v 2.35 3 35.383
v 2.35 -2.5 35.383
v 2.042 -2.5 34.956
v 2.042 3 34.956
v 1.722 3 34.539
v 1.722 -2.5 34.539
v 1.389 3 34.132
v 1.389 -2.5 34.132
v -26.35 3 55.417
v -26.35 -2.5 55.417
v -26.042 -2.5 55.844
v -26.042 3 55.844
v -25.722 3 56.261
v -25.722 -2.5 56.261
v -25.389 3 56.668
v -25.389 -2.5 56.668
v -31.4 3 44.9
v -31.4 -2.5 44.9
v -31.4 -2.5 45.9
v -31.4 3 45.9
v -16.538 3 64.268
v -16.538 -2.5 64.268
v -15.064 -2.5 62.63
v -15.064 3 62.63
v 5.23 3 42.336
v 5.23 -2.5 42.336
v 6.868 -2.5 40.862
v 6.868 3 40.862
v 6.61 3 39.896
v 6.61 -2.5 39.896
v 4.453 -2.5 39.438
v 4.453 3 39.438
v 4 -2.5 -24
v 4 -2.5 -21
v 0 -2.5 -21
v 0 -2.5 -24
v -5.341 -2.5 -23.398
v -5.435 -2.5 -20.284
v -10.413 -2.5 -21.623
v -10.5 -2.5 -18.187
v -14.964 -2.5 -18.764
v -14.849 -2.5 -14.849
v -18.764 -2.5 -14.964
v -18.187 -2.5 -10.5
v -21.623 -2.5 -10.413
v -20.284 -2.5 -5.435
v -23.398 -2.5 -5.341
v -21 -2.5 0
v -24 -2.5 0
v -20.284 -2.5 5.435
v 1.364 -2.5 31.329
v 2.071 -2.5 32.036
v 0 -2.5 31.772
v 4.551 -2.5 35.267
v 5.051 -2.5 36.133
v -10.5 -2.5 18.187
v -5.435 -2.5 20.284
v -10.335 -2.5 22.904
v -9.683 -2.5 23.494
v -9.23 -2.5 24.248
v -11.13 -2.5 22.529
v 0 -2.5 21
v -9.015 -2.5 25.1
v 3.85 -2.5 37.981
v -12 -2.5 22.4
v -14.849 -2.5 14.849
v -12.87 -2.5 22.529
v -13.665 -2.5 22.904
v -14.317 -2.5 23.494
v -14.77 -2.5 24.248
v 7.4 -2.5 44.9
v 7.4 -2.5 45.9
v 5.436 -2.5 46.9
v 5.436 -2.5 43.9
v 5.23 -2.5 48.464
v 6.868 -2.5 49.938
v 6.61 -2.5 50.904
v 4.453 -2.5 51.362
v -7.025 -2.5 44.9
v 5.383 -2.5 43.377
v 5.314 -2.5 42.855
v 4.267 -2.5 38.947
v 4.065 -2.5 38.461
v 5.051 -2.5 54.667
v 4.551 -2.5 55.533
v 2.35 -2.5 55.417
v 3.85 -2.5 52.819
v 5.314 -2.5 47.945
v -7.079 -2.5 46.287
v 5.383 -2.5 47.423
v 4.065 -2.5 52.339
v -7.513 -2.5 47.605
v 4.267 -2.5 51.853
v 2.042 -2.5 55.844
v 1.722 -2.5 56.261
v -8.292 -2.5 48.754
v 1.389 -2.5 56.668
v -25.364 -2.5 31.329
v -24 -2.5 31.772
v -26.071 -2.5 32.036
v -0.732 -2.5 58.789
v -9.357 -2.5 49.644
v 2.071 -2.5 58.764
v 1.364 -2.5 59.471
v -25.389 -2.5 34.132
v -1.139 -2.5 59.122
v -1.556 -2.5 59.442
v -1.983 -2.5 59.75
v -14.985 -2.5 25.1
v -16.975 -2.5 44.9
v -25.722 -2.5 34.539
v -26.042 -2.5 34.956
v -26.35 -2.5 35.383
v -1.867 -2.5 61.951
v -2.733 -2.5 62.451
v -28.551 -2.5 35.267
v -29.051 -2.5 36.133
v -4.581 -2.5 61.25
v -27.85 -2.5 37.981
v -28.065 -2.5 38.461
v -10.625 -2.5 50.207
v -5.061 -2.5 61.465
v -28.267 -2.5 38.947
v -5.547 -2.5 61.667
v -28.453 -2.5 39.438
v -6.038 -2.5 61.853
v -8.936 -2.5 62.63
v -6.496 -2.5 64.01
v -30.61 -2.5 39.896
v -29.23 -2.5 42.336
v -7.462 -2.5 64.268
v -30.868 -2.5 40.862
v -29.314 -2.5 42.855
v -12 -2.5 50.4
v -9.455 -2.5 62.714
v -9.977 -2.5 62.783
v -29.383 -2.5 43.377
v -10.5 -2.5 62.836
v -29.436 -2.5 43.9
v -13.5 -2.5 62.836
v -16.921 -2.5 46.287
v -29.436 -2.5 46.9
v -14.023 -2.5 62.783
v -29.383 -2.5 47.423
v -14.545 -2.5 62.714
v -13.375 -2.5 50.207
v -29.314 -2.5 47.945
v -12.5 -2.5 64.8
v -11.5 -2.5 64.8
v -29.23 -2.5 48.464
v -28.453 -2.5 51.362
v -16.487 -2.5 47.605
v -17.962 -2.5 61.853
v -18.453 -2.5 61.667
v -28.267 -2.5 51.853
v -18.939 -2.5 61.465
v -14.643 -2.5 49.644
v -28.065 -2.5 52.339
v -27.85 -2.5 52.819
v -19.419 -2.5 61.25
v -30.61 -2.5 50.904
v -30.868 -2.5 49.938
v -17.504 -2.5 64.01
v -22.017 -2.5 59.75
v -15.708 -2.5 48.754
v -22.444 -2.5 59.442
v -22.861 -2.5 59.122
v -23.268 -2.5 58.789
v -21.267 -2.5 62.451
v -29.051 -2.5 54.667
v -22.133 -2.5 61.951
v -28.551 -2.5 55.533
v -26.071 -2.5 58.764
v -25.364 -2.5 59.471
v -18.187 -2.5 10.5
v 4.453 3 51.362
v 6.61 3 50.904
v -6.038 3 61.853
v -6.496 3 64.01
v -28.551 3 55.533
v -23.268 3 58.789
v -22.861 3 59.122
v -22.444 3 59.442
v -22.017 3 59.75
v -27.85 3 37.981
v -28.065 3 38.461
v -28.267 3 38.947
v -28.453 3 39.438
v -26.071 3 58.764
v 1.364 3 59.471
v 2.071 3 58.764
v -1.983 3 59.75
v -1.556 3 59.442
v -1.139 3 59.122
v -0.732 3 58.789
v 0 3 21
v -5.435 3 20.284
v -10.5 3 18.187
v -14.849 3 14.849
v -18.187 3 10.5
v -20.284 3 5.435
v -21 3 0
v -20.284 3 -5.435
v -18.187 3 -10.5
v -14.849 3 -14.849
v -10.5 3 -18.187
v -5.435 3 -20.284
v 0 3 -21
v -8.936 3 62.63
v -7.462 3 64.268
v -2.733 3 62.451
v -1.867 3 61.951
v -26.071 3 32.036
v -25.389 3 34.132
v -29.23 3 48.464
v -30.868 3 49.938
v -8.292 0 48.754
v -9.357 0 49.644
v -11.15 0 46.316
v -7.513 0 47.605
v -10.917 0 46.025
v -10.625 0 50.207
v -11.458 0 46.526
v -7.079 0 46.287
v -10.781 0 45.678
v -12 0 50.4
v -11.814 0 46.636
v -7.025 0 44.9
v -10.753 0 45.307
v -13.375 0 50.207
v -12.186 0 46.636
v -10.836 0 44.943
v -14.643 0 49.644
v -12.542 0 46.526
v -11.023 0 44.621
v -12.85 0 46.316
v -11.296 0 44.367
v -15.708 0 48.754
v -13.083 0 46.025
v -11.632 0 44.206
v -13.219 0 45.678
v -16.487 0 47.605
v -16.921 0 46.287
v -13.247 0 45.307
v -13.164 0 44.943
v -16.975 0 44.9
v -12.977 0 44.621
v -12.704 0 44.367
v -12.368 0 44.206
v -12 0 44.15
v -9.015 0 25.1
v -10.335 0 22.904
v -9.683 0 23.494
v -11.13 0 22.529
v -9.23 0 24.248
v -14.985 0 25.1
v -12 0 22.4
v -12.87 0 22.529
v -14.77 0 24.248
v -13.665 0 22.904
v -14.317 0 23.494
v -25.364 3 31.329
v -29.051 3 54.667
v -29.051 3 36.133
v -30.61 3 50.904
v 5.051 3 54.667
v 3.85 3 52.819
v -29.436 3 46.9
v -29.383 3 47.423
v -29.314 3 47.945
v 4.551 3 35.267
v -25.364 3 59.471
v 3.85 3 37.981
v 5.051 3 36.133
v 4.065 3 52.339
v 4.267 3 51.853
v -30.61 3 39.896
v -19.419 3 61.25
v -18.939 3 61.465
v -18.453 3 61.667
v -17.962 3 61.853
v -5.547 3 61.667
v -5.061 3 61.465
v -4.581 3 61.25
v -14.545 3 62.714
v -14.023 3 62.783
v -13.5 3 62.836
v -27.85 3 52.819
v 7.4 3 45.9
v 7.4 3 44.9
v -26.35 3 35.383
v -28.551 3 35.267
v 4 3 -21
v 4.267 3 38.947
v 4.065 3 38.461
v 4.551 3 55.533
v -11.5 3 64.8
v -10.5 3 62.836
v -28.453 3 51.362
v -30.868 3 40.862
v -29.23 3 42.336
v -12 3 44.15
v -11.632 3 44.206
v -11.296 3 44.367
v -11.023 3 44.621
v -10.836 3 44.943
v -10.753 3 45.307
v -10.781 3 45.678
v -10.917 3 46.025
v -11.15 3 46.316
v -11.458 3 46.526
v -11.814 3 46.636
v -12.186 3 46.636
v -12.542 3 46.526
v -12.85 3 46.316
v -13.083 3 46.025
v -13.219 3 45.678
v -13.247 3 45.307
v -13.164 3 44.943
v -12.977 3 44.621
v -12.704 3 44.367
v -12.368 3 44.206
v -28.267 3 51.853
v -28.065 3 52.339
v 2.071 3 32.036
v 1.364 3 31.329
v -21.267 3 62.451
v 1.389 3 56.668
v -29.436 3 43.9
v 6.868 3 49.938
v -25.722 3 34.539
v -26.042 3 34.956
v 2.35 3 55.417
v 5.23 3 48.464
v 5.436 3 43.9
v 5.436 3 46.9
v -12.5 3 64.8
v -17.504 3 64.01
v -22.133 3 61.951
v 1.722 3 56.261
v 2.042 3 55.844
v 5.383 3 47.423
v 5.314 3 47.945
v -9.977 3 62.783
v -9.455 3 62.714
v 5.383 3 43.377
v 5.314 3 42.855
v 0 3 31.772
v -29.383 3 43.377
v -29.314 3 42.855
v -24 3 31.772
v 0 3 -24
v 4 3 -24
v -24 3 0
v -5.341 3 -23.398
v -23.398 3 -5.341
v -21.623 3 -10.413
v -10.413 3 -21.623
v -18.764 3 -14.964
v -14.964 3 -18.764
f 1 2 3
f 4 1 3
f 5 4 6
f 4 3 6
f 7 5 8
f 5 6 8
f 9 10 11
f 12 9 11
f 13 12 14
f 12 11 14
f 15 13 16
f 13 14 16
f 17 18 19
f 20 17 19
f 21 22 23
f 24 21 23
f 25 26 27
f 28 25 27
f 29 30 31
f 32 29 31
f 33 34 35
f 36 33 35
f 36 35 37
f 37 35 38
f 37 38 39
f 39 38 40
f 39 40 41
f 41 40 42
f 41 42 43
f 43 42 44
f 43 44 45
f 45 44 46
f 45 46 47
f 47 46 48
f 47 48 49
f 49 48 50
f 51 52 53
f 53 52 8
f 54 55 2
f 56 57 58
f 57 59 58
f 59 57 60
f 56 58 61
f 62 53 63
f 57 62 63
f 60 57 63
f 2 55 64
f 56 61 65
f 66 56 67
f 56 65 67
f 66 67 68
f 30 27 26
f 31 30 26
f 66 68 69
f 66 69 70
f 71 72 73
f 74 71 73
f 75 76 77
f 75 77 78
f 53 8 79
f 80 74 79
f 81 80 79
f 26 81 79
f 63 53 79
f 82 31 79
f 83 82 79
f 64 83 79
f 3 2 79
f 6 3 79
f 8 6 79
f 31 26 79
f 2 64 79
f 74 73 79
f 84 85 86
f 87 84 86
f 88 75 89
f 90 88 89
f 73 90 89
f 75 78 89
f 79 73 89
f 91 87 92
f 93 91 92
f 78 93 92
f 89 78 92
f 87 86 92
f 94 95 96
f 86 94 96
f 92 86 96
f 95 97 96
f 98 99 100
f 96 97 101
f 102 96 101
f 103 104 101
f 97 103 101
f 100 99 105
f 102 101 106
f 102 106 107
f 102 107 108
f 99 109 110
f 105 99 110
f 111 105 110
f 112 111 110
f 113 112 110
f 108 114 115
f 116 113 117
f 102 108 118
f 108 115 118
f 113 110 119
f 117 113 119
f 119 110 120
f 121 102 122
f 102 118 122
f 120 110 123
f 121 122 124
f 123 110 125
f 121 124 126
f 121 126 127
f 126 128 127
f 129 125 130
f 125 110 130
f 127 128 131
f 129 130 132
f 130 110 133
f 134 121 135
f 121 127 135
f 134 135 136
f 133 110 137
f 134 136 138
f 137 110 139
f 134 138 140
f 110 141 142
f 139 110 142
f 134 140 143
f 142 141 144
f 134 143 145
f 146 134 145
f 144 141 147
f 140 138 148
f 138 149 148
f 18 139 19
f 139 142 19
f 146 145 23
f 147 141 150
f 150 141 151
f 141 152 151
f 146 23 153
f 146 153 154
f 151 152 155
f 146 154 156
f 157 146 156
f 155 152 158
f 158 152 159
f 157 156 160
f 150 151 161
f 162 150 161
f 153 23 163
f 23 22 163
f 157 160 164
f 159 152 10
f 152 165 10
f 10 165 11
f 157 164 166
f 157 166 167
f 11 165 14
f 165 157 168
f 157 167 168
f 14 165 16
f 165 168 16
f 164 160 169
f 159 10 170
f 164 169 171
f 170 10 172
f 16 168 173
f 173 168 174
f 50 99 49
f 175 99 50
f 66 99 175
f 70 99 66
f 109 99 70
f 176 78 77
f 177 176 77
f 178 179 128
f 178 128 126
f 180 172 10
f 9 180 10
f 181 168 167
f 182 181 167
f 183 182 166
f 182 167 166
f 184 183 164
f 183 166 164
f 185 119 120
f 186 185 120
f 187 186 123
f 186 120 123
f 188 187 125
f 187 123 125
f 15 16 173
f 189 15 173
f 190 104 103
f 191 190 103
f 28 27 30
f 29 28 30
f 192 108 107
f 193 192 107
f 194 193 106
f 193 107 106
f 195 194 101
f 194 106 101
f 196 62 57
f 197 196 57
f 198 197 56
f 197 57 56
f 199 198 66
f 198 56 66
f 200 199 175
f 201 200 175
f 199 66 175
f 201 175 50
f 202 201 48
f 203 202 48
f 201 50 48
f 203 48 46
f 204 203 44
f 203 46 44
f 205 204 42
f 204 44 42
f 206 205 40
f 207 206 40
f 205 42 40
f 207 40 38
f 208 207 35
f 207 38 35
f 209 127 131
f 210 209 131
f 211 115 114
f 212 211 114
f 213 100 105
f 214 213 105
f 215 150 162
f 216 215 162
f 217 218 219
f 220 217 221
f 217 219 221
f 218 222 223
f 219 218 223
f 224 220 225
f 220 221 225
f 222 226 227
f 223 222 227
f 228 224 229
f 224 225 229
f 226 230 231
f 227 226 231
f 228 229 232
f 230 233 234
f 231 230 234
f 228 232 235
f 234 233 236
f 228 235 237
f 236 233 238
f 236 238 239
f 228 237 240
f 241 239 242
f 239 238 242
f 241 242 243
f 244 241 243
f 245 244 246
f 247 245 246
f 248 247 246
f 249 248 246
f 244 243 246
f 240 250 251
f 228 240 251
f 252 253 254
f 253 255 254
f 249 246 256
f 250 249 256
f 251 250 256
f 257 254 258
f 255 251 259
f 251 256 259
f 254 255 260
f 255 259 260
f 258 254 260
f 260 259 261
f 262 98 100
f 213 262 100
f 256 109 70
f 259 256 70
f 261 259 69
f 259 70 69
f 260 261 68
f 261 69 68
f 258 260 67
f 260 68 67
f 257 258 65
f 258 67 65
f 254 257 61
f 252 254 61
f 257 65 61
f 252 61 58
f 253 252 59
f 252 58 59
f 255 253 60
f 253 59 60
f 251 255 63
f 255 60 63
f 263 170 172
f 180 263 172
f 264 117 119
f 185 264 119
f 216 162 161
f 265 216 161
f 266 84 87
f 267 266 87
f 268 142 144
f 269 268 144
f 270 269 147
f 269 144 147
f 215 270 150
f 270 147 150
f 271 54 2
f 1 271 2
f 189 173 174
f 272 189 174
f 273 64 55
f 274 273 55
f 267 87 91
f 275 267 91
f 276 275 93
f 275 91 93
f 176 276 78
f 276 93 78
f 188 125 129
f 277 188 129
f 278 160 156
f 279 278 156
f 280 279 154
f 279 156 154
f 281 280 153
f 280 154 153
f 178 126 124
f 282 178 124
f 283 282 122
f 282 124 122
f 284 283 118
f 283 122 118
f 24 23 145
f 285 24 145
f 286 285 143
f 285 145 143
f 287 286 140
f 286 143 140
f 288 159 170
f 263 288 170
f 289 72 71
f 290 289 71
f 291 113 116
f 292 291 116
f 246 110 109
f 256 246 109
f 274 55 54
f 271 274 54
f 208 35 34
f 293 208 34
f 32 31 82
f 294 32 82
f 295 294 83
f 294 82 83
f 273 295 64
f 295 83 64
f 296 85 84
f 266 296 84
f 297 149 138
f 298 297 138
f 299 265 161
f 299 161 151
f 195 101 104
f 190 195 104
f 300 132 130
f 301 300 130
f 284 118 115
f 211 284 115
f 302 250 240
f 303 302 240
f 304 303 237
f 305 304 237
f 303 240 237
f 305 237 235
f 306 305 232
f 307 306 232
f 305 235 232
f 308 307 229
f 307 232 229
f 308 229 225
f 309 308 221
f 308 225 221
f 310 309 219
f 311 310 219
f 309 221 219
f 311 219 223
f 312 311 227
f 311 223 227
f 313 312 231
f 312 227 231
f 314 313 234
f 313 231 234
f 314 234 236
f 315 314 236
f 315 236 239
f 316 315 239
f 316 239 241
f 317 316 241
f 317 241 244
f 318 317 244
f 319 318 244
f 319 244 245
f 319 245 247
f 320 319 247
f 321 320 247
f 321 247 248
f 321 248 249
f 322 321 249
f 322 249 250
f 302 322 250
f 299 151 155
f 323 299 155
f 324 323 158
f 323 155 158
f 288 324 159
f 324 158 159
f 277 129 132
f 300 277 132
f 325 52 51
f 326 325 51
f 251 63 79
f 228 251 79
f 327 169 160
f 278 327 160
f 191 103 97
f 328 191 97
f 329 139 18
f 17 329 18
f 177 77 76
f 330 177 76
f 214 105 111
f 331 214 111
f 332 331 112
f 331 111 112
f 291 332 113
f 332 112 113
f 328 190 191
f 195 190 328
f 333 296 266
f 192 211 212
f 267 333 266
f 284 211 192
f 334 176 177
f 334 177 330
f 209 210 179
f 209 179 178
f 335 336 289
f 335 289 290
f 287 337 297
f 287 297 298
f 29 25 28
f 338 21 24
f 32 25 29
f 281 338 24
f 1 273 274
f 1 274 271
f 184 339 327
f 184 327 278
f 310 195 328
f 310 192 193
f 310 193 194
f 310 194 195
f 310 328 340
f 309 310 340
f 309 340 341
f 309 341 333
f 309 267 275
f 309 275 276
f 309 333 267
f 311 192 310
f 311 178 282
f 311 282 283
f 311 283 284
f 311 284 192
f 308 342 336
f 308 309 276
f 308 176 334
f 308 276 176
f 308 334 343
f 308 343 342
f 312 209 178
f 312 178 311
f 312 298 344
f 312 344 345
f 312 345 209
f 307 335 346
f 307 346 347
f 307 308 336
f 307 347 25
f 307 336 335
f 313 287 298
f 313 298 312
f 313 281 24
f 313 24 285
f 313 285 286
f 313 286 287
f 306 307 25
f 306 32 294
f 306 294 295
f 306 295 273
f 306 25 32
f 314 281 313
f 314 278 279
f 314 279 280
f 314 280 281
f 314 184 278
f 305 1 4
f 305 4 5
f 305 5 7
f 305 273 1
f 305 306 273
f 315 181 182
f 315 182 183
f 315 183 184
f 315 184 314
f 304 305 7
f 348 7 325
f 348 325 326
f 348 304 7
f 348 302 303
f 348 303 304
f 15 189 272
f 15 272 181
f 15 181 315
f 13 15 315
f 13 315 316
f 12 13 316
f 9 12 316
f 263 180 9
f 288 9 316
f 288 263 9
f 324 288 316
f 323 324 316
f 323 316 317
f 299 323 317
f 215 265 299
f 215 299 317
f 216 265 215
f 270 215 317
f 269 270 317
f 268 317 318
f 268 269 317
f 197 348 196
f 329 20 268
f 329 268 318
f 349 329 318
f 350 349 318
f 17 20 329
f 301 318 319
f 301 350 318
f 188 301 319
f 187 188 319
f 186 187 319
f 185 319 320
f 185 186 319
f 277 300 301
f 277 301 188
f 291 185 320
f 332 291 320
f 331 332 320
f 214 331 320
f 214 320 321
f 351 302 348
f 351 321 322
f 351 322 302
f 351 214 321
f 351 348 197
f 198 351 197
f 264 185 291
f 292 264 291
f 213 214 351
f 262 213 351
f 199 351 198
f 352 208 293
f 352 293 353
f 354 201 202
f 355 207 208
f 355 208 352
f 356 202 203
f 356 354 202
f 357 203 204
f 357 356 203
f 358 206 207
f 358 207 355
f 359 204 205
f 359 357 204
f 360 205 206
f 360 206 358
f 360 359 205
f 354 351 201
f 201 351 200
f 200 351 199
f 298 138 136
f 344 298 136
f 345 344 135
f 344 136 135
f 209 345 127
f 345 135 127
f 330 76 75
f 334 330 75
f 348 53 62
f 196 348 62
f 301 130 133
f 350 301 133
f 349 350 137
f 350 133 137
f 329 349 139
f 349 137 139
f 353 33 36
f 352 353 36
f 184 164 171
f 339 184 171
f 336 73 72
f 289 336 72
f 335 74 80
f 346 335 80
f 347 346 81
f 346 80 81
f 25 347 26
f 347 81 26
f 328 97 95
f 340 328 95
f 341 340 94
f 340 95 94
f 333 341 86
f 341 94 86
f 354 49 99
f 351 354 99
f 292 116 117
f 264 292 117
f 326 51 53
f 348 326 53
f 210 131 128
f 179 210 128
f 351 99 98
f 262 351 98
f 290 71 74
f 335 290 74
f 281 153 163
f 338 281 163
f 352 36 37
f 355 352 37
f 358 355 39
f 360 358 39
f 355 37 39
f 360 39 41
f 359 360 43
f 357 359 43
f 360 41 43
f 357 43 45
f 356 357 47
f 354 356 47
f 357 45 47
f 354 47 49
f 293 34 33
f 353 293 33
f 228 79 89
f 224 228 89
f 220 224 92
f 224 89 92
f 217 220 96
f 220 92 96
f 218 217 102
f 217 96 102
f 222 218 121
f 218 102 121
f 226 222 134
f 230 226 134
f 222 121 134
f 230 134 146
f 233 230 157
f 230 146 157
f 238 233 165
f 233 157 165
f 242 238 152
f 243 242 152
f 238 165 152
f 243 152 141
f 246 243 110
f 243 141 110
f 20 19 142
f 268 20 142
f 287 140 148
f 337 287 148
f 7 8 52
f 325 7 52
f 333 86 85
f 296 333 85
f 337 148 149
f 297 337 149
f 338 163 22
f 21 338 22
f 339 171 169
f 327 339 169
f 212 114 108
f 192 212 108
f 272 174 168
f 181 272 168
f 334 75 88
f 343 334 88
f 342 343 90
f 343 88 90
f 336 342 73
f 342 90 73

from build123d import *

# Parameters (mm, degrees)
BOSS_EXTRUDE1_DEPTH = 3
SKETCH3_W           = 3
SKETCH3_H           = 3
BOSS_EXTRUDE2_DEPTH = 4
BOSS_EXTRUDE3_START = 2.5
BOSS_EXTRUDE3_DEPTH = 2.5
SKETCH5_R           = 1.25
CUT_EXTRUDE1_DEPTH  = 16.5


with BuildPart() as part:
    # Sketch1 → Boss-Extrude1 (new body)
    with BuildSketch(Plane(origin=(0, 0, 0), x_dir=(1, 0, 0), z_dir=(0, 1, 0))):
        with BuildLine():
            Line((0, 21), (0, 24))
            ThreePointArc((0, 24), (-16.970562748, 16.970562748), (-24, 0))
            Line((-24, 0), (-24, -31.772426197))
            Line((-24, -31.772426197), (-25.364318164, -31.328575054))
            Line((-25.364318164, -31.328575054), (-26.071424946, -32.035681836))
            Line((-26.071424946, -32.035681836), (-25.389488178, -34.131832166))
            ThreePointArc((-25.389488178, -34.131832166), (-25.883683455, -34.746674992), (-26.349668871, -35.383164007))
            Line((-26.349668871, -35.383164007), (-28.550892833, -35.266987298))
            Line((-28.550892833, -35.266987298), (-29.050892833, -36.133012702))
            Line((-29.050892833, -36.133012702), (-27.849668871, -37.981240219))
            ThreePointArc((-27.849668871, -37.981240219), (-28.167891819, -38.703039934), (-28.453263687, -39.438447012))
            Line((-28.453263687, -39.438447012), (-30.609551507, -39.895947612))
            Line((-30.609551507, -39.895947612), (-30.868370553, -40.861873438))
            Line((-30.868370553, -40.861873438), (-29.229720823, -42.33622449))
            ThreePointArc((-29.229720823, -42.33622449), (-29.350285074, -43.115791636), (-29.435595774, -43.9))
            Line((-29.435595774, -43.9), (-31.4, -44.9))
            Line((-31.4, -44.9), (-31.4, -45.9))
            Line((-31.4, -45.9), (-29.435595774, -46.9))
            ThreePointArc((-29.435595774, -46.9), (-29.350285074, -47.684208364), (-29.229720823, -48.46377551))
            Line((-29.229720823, -48.46377551), (-30.868370553, -49.938126562))
            Line((-30.868370553, -49.938126562), (-30.609551507, -50.904052388))
            Line((-30.609551507, -50.904052388), (-28.453263687, -51.361552988))
            ThreePointArc((-28.453263687, -51.361552988), (-28.167891819, -52.096960066), (-27.849668871, -52.818759781))
            Line((-27.849668871, -52.818759781), (-29.050892833, -54.666987298))
            Line((-29.050892833, -54.666987298), (-28.550892833, -55.533012702))
            Line((-28.550892833, -55.533012702), (-26.349668871, -55.416835993))
            ThreePointArc((-26.349668871, -55.416835993), (-25.883683455, -56.053325008), (-25.389488178, -56.668167834))
            Line((-25.389488178, -56.668167834), (-26.071424946, -58.764318164))
            Line((-26.071424946, -58.764318164), (-25.364318164, -59.471424946))
            Line((-25.364318164, -59.471424946), (-23.268167834, -58.789488178))
            ThreePointArc((-23.268167834, -58.789488178), (-22.653325008, -59.283683455), (-22.016835993, -59.749668871))
            Line((-22.016835993, -59.749668871), (-22.133012702, -61.950892833))
            Line((-22.133012702, -61.950892833), (-21.266987298, -62.450892833))
            Line((-21.266987298, -62.450892833), (-19.418759781, -61.249668871))
            ThreePointArc((-19.418759781, -61.249668871), (-18.696960066, -61.567891819), (-17.961552988, -61.853263687))
            Line((-17.961552988, -61.853263687), (-17.504052388, -64.009551507))
            Line((-17.504052388, -64.009551507), (-16.538126562, -64.268370553))
            Line((-16.538126562, -64.268370553), (-15.06377551, -62.629720823))
            ThreePointArc((-15.06377551, -62.629720823), (-14.284208364, -62.750285074), (-13.5, -62.835595774))
            Line((-13.5, -62.835595774), (-12.5, -64.8))
            Line((-12.5, -64.8), (-11.5, -64.8))
            Line((-11.5, -64.8), (-10.5, -62.835595774))
            ThreePointArc((-10.5, -62.835595774), (-9.715791636, -62.750285074), (-8.93622449, -62.629720823))
            Line((-8.93622449, -62.629720823), (-7.461873438, -64.268370553))
            Line((-7.461873438, -64.268370553), (-6.495947612, -64.009551507))
            Line((-6.495947612, -64.009551507), (-6.038447012, -61.853263687))
            ThreePointArc((-6.038447012, -61.853263687), (-5.303039934, -61.567891819), (-4.581240219, -61.249668871))
            Line((-4.581240219, -61.249668871), (-2.733012702, -62.450892833))
            Line((-2.733012702, -62.450892833), (-1.866987298, -61.950892833))
            Line((-1.866987298, -61.950892833), (-1.983164007, -59.749668871))
            ThreePointArc((-1.983164007, -59.749668871), (-1.346674992, -59.283683455), (-0.731832166, -58.789488178))
            Line((-0.731832166, -58.789488178), (1.364318164, -59.471424946))
            Line((1.364318164, -59.471424946), (2.071424946, -58.764318164))
            Line((2.071424946, -58.764318164), (1.389488178, -56.668167834))
            ThreePointArc((1.389488178, -56.668167834), (1.883683455, -56.053325008), (2.349668871, -55.416835993))
            Line((2.349668871, -55.416835993), (4.550892833, -55.533012702))
            Line((4.550892833, -55.533012702), (5.050892833, -54.666987298))
            Line((5.050892833, -54.666987298), (3.849668871, -52.818759781))
            ThreePointArc((3.849668871, -52.818759781), (4.167891819, -52.096960066), (4.453263687, -51.361552988))
            Line((4.453263687, -51.361552988), (6.609551507, -50.904052388))
            Line((6.609551507, -50.904052388), (6.868370553, -49.938126562))
            Line((6.868370553, -49.938126562), (5.229720823, -48.46377551))
            ThreePointArc((5.229720823, -48.46377551), (5.350285074, -47.684208364), (5.435595774, -46.9))
            Line((5.435595774, -46.9), (7.4, -45.9))
            Line((7.4, -45.9), (7.4, -44.9))
            Line((7.4, -44.9), (5.435595774, -43.9))
            ThreePointArc((5.435595774, -43.9), (5.350285074, -43.115791636), (5.229720823, -42.33622449))
            Line((5.229720823, -42.33622449), (6.868370553, -40.861873438))
            Line((6.868370553, -40.861873438), (6.609551507, -39.895947612))
            Line((6.609551507, -39.895947612), (4.453263687, -39.438447012))
            ThreePointArc((4.453263687, -39.438447012), (4.167891819, -38.703039934), (3.849668871, -37.981240219))
            Line((3.849668871, -37.981240219), (5.050892833, -36.133012702))
            Line((5.050892833, -36.133012702), (4.550892833, -35.266987298))
            Line((4.550892833, -35.266987298), (2.349668871, -35.383164007))
            ThreePointArc((2.349668871, -35.383164007), (1.883683455, -34.746674992), (1.389488178, -34.131832166))
            Line((1.389488178, -34.131832166), (2.071424946, -32.035681836))
            Line((2.071424946, -32.035681836), (1.364318164, -31.328575054))
            Line((1.364318164, -31.328575054), (0, -31.772426197))
            Line((0, -31.772426197), (0, -21))
            ThreePointArc((0, -21), (-21, 0), (0, 21))
        make_face()
    extrude(amount=BOSS_EXTRUDE1_DEPTH)

    # Sketch3 → Boss-Extrude2 (add)
    with BuildSketch(Plane(origin=(0, 0, 0), x_dir=(0, 0, -1), z_dir=(1, 0, 0))):
        with Locations((22.5, 1.5)):
            Rectangle(SKETCH3_W, SKETCH3_H)
    extrude(amount=BOSS_EXTRUDE2_DEPTH)

    # Sketch4 → Boss-Extrude3 (add)
    with BuildSketch(Plane.XZ.offset(BOSS_EXTRUDE3_START)):
        with BuildLine():
            Line((0, 31.772426197), (0, 21))
            ThreePointArc((0, 21), (-21, 0), (0, -21))
            Line((0, -21), (4, -21))
            Line((4, -21), (4, -24))
            Line((4, -24), (0, -24))
            ThreePointArc((0, -24), (-16.970562748, -16.970562748), (-24, 0))
            Line((-24, 0), (-24, 31.772426197))
            Line((-24, 31.772426197), (-25.364318164, 31.328575054))
            Line((-25.364318164, 31.328575054), (-26.071424946, 32.035681836))
            Line((-26.071424946, 32.035681836), (-25.389488178, 34.131832166))
            ThreePointArc((-25.389488178, 34.131832166), (-25.883683455, 34.746674992), (-26.349668871, 35.383164007))
            Line((-26.349668871, 35.383164007), (-28.550892833, 35.266987298))
            Line((-28.550892833, 35.266987298), (-29.050892833, 36.133012702))
            Line((-29.050892833, 36.133012702), (-27.849668871, 37.981240219))
            ThreePointArc((-27.849668871, 37.981240219), (-28.167891819, 38.703039934), (-28.453263687, 39.438447012))
            Line((-28.453263687, 39.438447012), (-30.609551507, 39.895947612))
            Line((-30.609551507, 39.895947612), (-30.868370553, 40.861873438))
            Line((-30.868370553, 40.861873438), (-29.229720823, 42.33622449))
            ThreePointArc((-29.229720823, 42.33622449), (-29.350285074, 43.115791636), (-29.435595774, 43.9))
            Line((-29.435595774, 43.9), (-31.4, 44.9))
            Line((-31.4, 44.9), (-31.4, 45.9))
            Line((-31.4, 45.9), (-29.435595774, 46.9))
            ThreePointArc((-29.435595774, 46.9), (-29.350285074, 47.684208364), (-29.229720823, 48.46377551))
            Line((-29.229720823, 48.46377551), (-30.868370553, 49.938126562))
            Line((-30.868370553, 49.938126562), (-30.609551507, 50.904052388))
            Line((-30.609551507, 50.904052388), (-28.453263687, 51.361552988))
            ThreePointArc((-28.453263687, 51.361552988), (-28.167891819, 52.096960066), (-27.849668871, 52.818759781))
            Line((-27.849668871, 52.818759781), (-29.050892833, 54.666987298))
            Line((-29.050892833, 54.666987298), (-28.550892833, 55.533012702))
            Line((-28.550892833, 55.533012702), (-26.349668871, 55.416835993))
            ThreePointArc((-26.349668871, 55.416835993), (-25.883683455, 56.053325008), (-25.389488178, 56.668167834))
            Line((-25.389488178, 56.668167834), (-26.071424946, 58.764318164))
            Line((-26.071424946, 58.764318164), (-25.364318164, 59.471424946))
            Line((-25.364318164, 59.471424946), (-23.268167834, 58.789488178))
            ThreePointArc((-23.268167834, 58.789488178), (-22.653325008, 59.283683455), (-22.016835993, 59.749668871))
            Line((-22.016835993, 59.749668871), (-22.133012702, 61.950892833))
            Line((-22.133012702, 61.950892833), (-21.266987298, 62.450892833))
            Line((-21.266987298, 62.450892833), (-19.418759781, 61.249668871))
            ThreePointArc((-19.418759781, 61.249668871), (-18.696960066, 61.567891819), (-17.961552988, 61.853263687))
            Line((-17.961552988, 61.853263687), (-17.504052388, 64.009551507))
            Line((-17.504052388, 64.009551507), (-16.538126562, 64.268370553))
            Line((-16.538126562, 64.268370553), (-15.06377551, 62.629720823))
            ThreePointArc((-15.06377551, 62.629720823), (-14.284208364, 62.750285074), (-13.5, 62.835595774))
            Line((-13.5, 62.835595774), (-12.5, 64.8))
            Line((-12.5, 64.8), (-11.5, 64.8))
            Line((-11.5, 64.8), (-10.5, 62.835595774))
            ThreePointArc((-10.5, 62.835595774), (-9.715791636, 62.750285074), (-8.93622449, 62.629720823))
            Line((-8.93622449, 62.629720823), (-7.461873438, 64.268370553))
            Line((-7.461873438, 64.268370553), (-6.495947612, 64.009551507))
            Line((-6.495947612, 64.009551507), (-6.038447012, 61.853263687))
            ThreePointArc((-6.038447012, 61.853263687), (-5.303039934, 61.567891819), (-4.581240219, 61.249668871))
            Line((-4.581240219, 61.249668871), (-2.733012702, 62.450892833))
            Line((-2.733012702, 62.450892833), (-1.866987298, 61.950892833))
            Line((-1.866987298, 61.950892833), (-1.983164007, 59.749668871))
            ThreePointArc((-1.983164007, 59.749668871), (-1.346674992, 59.283683455), (-0.731832166, 58.789488178))
            Line((-0.731832166, 58.789488178), (1.364318164, 59.471424946))
            Line((1.364318164, 59.471424946), (2.071424946, 58.764318164))
            Line((2.071424946, 58.764318164), (1.389488178, 56.668167834))
            ThreePointArc((1.389488178, 56.668167834), (1.883683455, 56.053325008), (2.349668871, 55.416835993))
            Line((2.349668871, 55.416835993), (4.550892833, 55.533012702))
            Line((4.550892833, 55.533012702), (5.050892833, 54.666987298))
            Line((5.050892833, 54.666987298), (3.849668871, 52.818759781))
            ThreePointArc((3.849668871, 52.818759781), (4.167891819, 52.096960066), (4.453263687, 51.361552988))
            Line((4.453263687, 51.361552988), (6.609551507, 50.904052388))
            Line((6.609551507, 50.904052388), (6.868370553, 49.938126562))
            Line((6.868370553, 49.938126562), (5.229720823, 48.46377551))
            ThreePointArc((5.229720823, 48.46377551), (5.350285074, 47.684208364), (5.435595774, 46.9))
            Line((5.435595774, 46.9), (7.4, 45.9))
            Line((7.4, 45.9), (7.4, 44.9))
            Line((7.4, 44.9), (5.435595774, 43.9))
            ThreePointArc((5.435595774, 43.9), (5.350285074, 43.115791636), (5.229720823, 42.33622449))
            Line((5.229720823, 42.33622449), (6.868370553, 40.861873438))
            Line((6.868370553, 40.861873438), (6.609551507, 39.895947612))
            Line((6.609551507, 39.895947612), (4.453263687, 39.438447012))
            ThreePointArc((4.453263687, 39.438447012), (4.167891819, 38.703039934), (3.849668871, 37.981240219))
            Line((3.849668871, 37.981240219), (5.050892833, 36.133012702))
            Line((5.050892833, 36.133012702), (4.550892833, 35.266987298))
            Line((4.550892833, 35.266987298), (2.349668871, 35.383164007))
            ThreePointArc((2.349668871, 35.383164007), (1.883683455, 34.746674992), (1.389488178, 34.131832166))
            Line((1.389488178, 34.131832166), (2.071424946, 32.035681836))
            Line((2.071424946, 32.035681836), (1.364318164, 31.328575054))
            Line((1.364318164, 31.328575054), (0, 31.772426197))
        make_face()
        with BuildLine():
            Line((-9.015037689, 25.1), (-7.025062814, 44.9))
            ThreePointArc((-7.025062814, 44.9), (-12, 50.4), (-16.974937186, 44.9))
            Line((-16.974937186, 44.9), (-14.984962311, 25.1))
            ThreePointArc((-14.984962311, 25.1), (-12, 22.4), (-9.015037689, 25.1))
        make_face(mode=Mode.SUBTRACT)
    extrude(amount=-BOSS_EXTRUDE3_DEPTH)

    # Sketch5 → Cut-Extrude1 (cut)
    with BuildSketch(Plane.XZ):
        with Locations(Location((-12, 45.4, 0), (0, 0, 270))):
            Circle(SKETCH5_R)
    extrude(amount=-CUT_EXTRUDE1_DEPTH, mode=Mode.SUBTRACT)


solid = part.part
